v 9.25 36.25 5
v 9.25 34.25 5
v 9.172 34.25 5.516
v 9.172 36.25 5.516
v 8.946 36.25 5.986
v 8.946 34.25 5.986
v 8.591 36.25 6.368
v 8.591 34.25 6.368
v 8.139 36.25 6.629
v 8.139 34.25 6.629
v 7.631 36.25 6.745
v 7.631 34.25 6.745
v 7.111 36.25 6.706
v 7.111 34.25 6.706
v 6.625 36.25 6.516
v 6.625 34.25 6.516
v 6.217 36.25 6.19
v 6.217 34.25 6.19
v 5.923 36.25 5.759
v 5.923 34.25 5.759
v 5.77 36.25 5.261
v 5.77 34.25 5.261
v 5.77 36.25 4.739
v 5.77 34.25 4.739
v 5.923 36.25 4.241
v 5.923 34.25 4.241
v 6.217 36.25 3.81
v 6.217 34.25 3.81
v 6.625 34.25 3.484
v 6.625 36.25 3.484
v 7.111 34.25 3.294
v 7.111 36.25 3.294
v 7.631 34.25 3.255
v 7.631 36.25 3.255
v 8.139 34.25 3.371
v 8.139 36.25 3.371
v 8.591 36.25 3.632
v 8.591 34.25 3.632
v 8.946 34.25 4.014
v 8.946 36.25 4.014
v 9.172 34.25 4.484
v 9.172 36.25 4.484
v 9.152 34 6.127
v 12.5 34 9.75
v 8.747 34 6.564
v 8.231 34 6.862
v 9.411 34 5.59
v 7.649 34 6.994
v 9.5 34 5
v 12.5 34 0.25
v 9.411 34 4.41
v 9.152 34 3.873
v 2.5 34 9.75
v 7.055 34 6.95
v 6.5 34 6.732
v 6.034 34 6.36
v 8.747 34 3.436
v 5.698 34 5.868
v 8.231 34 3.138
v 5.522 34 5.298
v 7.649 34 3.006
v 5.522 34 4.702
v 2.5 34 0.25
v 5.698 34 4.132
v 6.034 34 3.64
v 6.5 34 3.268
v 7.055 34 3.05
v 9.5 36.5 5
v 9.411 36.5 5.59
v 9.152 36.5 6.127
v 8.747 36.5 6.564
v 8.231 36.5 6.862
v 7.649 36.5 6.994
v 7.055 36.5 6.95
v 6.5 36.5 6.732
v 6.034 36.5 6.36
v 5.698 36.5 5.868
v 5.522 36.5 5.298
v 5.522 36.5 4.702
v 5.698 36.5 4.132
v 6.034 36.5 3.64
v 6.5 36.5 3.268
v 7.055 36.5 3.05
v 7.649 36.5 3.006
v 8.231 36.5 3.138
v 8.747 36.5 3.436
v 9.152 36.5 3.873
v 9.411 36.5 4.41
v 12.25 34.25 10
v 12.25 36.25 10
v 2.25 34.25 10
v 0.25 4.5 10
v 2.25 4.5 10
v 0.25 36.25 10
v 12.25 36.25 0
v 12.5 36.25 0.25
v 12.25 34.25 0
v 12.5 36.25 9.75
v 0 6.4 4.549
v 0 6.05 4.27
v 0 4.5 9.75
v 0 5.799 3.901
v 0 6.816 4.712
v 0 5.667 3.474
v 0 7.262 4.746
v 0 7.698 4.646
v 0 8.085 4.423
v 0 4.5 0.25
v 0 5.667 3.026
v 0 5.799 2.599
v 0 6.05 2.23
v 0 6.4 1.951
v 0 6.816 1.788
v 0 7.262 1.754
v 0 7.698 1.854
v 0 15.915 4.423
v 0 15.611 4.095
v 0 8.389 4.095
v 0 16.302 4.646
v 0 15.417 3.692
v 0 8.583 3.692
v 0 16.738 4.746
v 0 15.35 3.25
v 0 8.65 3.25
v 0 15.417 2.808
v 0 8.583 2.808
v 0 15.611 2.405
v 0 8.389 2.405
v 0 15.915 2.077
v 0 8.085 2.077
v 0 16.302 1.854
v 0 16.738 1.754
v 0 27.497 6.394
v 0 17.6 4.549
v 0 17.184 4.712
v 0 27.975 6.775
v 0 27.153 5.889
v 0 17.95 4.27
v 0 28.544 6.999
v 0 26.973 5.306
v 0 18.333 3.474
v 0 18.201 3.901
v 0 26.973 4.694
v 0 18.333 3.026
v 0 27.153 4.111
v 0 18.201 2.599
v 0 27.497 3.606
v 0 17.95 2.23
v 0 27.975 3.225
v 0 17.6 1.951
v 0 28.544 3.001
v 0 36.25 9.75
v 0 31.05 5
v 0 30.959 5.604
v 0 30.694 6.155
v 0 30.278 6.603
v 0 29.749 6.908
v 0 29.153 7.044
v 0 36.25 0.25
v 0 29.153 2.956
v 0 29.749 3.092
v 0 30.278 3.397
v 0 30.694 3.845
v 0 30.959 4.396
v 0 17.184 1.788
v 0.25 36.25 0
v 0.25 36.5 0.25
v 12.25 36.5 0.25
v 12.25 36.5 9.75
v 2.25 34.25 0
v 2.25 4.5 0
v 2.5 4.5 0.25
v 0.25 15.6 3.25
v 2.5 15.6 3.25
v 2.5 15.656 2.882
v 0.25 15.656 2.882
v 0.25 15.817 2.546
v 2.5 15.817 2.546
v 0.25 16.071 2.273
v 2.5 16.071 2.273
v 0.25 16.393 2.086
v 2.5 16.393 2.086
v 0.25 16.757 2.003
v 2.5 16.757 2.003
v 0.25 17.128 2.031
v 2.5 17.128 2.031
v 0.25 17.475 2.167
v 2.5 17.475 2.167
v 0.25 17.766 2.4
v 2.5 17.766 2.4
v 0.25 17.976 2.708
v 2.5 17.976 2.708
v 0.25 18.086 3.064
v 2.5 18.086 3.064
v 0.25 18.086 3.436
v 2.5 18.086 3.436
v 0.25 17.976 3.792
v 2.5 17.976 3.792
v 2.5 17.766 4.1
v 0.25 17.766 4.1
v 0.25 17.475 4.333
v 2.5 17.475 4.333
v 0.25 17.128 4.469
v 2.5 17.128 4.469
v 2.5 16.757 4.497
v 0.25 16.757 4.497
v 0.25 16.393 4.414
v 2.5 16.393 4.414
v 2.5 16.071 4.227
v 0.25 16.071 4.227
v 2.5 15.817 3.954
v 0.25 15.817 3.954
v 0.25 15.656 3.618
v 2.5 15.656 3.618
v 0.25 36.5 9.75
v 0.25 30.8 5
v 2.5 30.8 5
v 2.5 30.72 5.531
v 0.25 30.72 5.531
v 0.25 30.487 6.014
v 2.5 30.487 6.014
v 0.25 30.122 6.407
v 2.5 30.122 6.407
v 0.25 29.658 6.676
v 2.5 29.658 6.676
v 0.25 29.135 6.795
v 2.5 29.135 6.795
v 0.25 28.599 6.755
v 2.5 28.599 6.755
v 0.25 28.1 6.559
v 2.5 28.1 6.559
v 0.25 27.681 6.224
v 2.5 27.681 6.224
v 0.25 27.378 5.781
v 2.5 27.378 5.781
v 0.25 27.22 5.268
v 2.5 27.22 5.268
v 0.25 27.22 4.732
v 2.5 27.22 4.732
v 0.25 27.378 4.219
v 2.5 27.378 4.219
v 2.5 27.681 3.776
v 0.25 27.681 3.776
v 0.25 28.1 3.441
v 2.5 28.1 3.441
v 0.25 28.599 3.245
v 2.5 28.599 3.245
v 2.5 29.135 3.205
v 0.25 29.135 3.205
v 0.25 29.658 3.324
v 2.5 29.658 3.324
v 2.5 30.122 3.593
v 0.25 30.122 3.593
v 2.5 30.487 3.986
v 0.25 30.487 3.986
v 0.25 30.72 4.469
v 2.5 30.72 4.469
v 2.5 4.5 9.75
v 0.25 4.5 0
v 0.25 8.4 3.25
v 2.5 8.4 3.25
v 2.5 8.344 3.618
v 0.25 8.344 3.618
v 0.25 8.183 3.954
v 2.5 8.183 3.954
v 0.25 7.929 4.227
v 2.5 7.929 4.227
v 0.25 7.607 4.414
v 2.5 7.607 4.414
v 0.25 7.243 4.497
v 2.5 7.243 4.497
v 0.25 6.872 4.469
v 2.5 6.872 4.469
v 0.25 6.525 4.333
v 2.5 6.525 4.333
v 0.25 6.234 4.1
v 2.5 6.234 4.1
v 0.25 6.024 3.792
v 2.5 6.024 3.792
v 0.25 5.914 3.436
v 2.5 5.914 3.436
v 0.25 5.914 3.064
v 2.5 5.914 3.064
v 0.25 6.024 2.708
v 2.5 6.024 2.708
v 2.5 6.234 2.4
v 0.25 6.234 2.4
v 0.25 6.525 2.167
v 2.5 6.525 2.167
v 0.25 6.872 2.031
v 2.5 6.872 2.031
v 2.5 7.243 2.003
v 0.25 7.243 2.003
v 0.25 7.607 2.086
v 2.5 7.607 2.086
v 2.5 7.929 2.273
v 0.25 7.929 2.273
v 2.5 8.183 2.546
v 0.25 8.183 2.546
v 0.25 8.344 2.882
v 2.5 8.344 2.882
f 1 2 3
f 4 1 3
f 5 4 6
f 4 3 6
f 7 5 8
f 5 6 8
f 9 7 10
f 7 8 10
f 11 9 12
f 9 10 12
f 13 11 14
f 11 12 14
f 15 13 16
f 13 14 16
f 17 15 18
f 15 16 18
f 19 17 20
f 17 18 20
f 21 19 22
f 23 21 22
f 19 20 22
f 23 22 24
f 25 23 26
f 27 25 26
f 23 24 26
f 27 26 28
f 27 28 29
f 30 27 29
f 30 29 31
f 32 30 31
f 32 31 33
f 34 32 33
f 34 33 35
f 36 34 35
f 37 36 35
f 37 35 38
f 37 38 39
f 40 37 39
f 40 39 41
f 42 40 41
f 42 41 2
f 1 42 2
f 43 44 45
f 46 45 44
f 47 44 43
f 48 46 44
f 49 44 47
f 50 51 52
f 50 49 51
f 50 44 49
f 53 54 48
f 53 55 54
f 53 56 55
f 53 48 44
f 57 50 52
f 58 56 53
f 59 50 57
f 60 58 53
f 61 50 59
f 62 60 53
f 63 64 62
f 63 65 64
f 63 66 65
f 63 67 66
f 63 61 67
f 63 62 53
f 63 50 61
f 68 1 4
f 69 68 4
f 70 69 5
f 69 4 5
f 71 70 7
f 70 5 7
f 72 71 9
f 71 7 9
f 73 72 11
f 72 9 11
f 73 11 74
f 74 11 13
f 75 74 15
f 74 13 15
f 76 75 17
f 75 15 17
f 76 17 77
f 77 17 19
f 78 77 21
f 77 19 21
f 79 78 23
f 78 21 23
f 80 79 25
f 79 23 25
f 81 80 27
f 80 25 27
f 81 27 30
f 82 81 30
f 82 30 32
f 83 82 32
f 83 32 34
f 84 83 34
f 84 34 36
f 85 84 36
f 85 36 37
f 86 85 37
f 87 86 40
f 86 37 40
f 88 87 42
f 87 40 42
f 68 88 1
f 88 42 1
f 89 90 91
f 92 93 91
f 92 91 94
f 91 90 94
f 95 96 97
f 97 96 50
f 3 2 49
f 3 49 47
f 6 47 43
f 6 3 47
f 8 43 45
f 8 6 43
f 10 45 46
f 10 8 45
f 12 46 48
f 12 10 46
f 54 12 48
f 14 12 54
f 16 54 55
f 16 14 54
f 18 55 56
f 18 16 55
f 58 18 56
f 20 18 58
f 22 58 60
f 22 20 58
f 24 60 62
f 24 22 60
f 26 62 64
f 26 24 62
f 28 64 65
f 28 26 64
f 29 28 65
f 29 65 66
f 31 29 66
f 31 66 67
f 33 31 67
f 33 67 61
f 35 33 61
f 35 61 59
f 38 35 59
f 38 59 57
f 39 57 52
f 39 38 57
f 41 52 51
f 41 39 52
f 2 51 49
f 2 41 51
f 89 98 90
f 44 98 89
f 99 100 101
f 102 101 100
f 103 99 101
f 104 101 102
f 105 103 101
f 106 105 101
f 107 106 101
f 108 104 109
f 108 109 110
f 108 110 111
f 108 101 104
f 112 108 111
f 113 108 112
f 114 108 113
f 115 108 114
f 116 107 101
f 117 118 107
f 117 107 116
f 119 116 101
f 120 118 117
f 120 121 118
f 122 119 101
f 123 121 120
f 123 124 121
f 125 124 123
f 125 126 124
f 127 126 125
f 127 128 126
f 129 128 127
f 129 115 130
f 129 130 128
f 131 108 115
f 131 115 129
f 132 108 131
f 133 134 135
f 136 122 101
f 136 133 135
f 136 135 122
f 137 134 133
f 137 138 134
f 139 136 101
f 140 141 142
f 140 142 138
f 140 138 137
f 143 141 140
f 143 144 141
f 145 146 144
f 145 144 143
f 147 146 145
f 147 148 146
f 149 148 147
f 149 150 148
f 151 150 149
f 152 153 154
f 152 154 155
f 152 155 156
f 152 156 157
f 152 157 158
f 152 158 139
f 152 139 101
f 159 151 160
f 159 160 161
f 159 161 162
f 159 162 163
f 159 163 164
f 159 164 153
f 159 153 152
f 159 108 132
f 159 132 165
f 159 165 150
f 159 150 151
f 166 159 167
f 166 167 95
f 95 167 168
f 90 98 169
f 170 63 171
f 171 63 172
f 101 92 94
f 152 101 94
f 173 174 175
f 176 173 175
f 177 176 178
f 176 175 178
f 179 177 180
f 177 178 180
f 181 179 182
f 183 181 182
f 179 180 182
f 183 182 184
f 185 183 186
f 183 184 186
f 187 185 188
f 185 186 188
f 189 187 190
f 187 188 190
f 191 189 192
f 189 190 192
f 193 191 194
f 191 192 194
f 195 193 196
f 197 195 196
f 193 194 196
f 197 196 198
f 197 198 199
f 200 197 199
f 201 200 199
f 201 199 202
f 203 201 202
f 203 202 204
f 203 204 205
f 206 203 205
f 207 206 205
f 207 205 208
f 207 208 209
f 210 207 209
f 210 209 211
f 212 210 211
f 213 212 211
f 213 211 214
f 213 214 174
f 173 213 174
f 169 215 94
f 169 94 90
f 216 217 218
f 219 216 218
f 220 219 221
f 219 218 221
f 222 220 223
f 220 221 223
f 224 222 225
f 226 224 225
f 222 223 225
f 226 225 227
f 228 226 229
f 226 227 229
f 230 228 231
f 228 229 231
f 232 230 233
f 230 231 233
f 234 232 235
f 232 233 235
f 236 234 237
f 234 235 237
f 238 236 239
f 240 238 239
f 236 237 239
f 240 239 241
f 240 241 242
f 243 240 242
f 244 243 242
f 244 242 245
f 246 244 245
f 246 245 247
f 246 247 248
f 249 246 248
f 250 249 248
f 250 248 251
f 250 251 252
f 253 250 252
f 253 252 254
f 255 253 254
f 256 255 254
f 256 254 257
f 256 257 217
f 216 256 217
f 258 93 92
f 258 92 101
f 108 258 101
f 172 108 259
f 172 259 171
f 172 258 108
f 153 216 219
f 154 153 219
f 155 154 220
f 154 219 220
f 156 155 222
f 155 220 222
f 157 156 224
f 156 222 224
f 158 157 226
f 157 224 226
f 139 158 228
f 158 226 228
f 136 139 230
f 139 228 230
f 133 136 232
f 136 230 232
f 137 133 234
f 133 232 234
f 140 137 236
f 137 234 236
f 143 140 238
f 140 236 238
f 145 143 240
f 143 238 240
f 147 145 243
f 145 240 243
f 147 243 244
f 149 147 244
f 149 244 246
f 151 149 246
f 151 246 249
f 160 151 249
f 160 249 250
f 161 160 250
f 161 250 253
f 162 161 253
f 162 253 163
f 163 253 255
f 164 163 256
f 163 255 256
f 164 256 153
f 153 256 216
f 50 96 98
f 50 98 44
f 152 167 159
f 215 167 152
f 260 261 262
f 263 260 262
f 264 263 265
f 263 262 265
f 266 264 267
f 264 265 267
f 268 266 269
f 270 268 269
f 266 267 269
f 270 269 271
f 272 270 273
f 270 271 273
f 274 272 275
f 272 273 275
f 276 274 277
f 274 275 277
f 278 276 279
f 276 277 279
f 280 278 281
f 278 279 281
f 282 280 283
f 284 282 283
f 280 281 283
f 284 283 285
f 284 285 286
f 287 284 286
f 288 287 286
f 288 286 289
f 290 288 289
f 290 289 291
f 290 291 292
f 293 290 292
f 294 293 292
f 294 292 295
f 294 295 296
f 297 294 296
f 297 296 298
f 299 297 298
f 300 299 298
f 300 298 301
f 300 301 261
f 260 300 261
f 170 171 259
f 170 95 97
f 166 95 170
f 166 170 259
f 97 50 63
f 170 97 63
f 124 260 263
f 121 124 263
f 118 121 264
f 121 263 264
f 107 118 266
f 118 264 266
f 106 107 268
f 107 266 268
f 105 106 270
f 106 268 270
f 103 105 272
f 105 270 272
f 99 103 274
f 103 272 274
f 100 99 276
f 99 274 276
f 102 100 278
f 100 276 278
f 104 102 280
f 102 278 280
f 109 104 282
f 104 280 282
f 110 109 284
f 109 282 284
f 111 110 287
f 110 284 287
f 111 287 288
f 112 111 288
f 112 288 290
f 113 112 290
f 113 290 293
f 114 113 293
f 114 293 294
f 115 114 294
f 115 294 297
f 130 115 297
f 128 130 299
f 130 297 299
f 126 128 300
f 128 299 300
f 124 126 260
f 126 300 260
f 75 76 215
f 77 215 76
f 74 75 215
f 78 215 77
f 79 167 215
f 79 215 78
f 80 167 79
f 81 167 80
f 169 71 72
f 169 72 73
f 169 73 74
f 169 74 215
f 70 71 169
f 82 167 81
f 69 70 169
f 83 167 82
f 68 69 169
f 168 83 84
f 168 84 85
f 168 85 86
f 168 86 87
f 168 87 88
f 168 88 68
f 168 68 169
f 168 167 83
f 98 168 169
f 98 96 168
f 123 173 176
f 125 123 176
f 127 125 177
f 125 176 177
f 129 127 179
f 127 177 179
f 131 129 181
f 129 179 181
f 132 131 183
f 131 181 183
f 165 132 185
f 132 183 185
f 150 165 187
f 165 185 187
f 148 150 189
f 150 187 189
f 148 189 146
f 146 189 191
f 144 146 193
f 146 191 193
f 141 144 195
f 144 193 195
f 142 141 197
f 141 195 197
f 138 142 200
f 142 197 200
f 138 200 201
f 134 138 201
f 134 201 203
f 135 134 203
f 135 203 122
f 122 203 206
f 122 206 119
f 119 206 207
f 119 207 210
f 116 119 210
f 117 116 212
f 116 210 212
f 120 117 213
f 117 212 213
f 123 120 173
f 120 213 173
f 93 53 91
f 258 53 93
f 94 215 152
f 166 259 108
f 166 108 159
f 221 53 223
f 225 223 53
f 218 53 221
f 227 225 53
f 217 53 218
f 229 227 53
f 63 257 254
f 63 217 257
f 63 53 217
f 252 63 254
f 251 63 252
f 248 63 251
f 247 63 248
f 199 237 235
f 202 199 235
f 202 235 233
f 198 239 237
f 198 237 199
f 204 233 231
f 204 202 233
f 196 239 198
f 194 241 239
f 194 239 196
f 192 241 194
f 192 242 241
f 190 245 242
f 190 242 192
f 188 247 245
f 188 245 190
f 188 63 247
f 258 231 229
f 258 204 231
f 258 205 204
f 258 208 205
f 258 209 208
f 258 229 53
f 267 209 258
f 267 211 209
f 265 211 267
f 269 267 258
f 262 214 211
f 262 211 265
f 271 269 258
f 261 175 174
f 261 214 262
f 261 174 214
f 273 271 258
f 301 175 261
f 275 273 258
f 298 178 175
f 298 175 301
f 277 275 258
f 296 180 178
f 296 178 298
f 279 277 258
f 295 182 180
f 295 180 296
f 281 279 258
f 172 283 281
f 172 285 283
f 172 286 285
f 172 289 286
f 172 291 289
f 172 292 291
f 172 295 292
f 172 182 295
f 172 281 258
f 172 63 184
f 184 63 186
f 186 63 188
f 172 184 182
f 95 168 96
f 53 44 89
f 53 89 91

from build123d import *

# Parameters (mm, degrees)
BOSS_EXTRUDE1_DEPTH = 10
SKETCH2_R           = 1.75
CUT_EXTRUDE1_DEPTH  = 10
SKETCH3_R           = 1.25
SKETCH3_R_2         = 1.8
CUT_EXTRUDE2_DEPTH  = 40.143965052
CHAMFER1_SIZE       = 0.25
SKETCH4_W           = 13.022509218
SKETCH4_H           = 4.5
CUT_EXTRUDE3_DEPTH  = 40.143965052


with BuildPart() as part:
    # Sketch1 → Boss-Extrude1 (new body)
    with BuildSketch(Plane.XY):
        Polygon((0, 0), (0, 36.5), (12.5, 36.5), (12.5, 34), (2.5, 34), (2.5, 0), align=None)
    extrude(amount=BOSS_EXTRUDE1_DEPTH)

    # Sketch2 → Cut-Extrude1 (cut)
    with BuildSketch(Plane.XZ.offset(-34)):
        with Locations((7.5, 5)):
            Circle(SKETCH2_R)
    extrude(amount=-CUT_EXTRUDE1_DEPTH, mode=Mode.SUBTRACT)

    # Sketch3 → Cut-Extrude2 (cut, through all)
    with BuildSketch(Plane(origin=(2.5, 0, 0), x_dir=(0, 0, -1), z_dir=(1, 0, 0))):
        with Locations(Location((-3.25, 7.15, 0), (0, 0, 90))):
            Circle(SKETCH3_R)
        with Locations(Location((-3.25, 16.85, 0), (0, 0, 270))):
            Circle(SKETCH3_R)
        with Locations(Location((-5, 29, 0), (0, 0, 90))):
            Circle(SKETCH3_R_2)
    extrude(amount=-CUT_EXTRUDE2_DEPTH, mode=Mode.SUBTRACT)

    # Chamfer1
    chamfer1_edges = [part.edges().sort_by_distance(p)[0] for p in [
        (0, 0, 5),
        (0, 36.5, 5),
        (12.5, 36.5, 5),
        (2.5, 0, 5),
        (7.5, 34, 10),
        (12.5, 35.25, 10),
        (5.75, 36.5, 5),
        (6.25, 36.5, 10),
        (5.75, 34, 5),
        (0, 18.25, 10),
        (0, 5.9, 3.25),
        (0, 18.1, 3.25),
        (0, 27.2, 5),
        (1.25, 0, 10),
        (0, 18.25, 0),
        (6.25, 36.5, 0),
        (12.5, 35.25, 0),
        (7.5, 34, 0),
        (2.5, 17, 0),
        (1.25, 0, 0),
        (2.5, 17, 10),
    ]]
    chamfer(chamfer1_edges, length=CHAMFER1_SIZE)

    # Sketch4 → Cut-Extrude3 (cut, through all)
    with BuildSketch(Plane(origin=(2.5, 0, 0), x_dir=(0, 0, -1), z_dir=(1, 0, 0))):
        with Locations((-6.511254609, 2.25)):
            Rectangle(SKETCH4_W, SKETCH4_H)
    extrude(amount=-CUT_EXTRUDE3_DEPTH, mode=Mode.SUBTRACT)


solid = part.part
